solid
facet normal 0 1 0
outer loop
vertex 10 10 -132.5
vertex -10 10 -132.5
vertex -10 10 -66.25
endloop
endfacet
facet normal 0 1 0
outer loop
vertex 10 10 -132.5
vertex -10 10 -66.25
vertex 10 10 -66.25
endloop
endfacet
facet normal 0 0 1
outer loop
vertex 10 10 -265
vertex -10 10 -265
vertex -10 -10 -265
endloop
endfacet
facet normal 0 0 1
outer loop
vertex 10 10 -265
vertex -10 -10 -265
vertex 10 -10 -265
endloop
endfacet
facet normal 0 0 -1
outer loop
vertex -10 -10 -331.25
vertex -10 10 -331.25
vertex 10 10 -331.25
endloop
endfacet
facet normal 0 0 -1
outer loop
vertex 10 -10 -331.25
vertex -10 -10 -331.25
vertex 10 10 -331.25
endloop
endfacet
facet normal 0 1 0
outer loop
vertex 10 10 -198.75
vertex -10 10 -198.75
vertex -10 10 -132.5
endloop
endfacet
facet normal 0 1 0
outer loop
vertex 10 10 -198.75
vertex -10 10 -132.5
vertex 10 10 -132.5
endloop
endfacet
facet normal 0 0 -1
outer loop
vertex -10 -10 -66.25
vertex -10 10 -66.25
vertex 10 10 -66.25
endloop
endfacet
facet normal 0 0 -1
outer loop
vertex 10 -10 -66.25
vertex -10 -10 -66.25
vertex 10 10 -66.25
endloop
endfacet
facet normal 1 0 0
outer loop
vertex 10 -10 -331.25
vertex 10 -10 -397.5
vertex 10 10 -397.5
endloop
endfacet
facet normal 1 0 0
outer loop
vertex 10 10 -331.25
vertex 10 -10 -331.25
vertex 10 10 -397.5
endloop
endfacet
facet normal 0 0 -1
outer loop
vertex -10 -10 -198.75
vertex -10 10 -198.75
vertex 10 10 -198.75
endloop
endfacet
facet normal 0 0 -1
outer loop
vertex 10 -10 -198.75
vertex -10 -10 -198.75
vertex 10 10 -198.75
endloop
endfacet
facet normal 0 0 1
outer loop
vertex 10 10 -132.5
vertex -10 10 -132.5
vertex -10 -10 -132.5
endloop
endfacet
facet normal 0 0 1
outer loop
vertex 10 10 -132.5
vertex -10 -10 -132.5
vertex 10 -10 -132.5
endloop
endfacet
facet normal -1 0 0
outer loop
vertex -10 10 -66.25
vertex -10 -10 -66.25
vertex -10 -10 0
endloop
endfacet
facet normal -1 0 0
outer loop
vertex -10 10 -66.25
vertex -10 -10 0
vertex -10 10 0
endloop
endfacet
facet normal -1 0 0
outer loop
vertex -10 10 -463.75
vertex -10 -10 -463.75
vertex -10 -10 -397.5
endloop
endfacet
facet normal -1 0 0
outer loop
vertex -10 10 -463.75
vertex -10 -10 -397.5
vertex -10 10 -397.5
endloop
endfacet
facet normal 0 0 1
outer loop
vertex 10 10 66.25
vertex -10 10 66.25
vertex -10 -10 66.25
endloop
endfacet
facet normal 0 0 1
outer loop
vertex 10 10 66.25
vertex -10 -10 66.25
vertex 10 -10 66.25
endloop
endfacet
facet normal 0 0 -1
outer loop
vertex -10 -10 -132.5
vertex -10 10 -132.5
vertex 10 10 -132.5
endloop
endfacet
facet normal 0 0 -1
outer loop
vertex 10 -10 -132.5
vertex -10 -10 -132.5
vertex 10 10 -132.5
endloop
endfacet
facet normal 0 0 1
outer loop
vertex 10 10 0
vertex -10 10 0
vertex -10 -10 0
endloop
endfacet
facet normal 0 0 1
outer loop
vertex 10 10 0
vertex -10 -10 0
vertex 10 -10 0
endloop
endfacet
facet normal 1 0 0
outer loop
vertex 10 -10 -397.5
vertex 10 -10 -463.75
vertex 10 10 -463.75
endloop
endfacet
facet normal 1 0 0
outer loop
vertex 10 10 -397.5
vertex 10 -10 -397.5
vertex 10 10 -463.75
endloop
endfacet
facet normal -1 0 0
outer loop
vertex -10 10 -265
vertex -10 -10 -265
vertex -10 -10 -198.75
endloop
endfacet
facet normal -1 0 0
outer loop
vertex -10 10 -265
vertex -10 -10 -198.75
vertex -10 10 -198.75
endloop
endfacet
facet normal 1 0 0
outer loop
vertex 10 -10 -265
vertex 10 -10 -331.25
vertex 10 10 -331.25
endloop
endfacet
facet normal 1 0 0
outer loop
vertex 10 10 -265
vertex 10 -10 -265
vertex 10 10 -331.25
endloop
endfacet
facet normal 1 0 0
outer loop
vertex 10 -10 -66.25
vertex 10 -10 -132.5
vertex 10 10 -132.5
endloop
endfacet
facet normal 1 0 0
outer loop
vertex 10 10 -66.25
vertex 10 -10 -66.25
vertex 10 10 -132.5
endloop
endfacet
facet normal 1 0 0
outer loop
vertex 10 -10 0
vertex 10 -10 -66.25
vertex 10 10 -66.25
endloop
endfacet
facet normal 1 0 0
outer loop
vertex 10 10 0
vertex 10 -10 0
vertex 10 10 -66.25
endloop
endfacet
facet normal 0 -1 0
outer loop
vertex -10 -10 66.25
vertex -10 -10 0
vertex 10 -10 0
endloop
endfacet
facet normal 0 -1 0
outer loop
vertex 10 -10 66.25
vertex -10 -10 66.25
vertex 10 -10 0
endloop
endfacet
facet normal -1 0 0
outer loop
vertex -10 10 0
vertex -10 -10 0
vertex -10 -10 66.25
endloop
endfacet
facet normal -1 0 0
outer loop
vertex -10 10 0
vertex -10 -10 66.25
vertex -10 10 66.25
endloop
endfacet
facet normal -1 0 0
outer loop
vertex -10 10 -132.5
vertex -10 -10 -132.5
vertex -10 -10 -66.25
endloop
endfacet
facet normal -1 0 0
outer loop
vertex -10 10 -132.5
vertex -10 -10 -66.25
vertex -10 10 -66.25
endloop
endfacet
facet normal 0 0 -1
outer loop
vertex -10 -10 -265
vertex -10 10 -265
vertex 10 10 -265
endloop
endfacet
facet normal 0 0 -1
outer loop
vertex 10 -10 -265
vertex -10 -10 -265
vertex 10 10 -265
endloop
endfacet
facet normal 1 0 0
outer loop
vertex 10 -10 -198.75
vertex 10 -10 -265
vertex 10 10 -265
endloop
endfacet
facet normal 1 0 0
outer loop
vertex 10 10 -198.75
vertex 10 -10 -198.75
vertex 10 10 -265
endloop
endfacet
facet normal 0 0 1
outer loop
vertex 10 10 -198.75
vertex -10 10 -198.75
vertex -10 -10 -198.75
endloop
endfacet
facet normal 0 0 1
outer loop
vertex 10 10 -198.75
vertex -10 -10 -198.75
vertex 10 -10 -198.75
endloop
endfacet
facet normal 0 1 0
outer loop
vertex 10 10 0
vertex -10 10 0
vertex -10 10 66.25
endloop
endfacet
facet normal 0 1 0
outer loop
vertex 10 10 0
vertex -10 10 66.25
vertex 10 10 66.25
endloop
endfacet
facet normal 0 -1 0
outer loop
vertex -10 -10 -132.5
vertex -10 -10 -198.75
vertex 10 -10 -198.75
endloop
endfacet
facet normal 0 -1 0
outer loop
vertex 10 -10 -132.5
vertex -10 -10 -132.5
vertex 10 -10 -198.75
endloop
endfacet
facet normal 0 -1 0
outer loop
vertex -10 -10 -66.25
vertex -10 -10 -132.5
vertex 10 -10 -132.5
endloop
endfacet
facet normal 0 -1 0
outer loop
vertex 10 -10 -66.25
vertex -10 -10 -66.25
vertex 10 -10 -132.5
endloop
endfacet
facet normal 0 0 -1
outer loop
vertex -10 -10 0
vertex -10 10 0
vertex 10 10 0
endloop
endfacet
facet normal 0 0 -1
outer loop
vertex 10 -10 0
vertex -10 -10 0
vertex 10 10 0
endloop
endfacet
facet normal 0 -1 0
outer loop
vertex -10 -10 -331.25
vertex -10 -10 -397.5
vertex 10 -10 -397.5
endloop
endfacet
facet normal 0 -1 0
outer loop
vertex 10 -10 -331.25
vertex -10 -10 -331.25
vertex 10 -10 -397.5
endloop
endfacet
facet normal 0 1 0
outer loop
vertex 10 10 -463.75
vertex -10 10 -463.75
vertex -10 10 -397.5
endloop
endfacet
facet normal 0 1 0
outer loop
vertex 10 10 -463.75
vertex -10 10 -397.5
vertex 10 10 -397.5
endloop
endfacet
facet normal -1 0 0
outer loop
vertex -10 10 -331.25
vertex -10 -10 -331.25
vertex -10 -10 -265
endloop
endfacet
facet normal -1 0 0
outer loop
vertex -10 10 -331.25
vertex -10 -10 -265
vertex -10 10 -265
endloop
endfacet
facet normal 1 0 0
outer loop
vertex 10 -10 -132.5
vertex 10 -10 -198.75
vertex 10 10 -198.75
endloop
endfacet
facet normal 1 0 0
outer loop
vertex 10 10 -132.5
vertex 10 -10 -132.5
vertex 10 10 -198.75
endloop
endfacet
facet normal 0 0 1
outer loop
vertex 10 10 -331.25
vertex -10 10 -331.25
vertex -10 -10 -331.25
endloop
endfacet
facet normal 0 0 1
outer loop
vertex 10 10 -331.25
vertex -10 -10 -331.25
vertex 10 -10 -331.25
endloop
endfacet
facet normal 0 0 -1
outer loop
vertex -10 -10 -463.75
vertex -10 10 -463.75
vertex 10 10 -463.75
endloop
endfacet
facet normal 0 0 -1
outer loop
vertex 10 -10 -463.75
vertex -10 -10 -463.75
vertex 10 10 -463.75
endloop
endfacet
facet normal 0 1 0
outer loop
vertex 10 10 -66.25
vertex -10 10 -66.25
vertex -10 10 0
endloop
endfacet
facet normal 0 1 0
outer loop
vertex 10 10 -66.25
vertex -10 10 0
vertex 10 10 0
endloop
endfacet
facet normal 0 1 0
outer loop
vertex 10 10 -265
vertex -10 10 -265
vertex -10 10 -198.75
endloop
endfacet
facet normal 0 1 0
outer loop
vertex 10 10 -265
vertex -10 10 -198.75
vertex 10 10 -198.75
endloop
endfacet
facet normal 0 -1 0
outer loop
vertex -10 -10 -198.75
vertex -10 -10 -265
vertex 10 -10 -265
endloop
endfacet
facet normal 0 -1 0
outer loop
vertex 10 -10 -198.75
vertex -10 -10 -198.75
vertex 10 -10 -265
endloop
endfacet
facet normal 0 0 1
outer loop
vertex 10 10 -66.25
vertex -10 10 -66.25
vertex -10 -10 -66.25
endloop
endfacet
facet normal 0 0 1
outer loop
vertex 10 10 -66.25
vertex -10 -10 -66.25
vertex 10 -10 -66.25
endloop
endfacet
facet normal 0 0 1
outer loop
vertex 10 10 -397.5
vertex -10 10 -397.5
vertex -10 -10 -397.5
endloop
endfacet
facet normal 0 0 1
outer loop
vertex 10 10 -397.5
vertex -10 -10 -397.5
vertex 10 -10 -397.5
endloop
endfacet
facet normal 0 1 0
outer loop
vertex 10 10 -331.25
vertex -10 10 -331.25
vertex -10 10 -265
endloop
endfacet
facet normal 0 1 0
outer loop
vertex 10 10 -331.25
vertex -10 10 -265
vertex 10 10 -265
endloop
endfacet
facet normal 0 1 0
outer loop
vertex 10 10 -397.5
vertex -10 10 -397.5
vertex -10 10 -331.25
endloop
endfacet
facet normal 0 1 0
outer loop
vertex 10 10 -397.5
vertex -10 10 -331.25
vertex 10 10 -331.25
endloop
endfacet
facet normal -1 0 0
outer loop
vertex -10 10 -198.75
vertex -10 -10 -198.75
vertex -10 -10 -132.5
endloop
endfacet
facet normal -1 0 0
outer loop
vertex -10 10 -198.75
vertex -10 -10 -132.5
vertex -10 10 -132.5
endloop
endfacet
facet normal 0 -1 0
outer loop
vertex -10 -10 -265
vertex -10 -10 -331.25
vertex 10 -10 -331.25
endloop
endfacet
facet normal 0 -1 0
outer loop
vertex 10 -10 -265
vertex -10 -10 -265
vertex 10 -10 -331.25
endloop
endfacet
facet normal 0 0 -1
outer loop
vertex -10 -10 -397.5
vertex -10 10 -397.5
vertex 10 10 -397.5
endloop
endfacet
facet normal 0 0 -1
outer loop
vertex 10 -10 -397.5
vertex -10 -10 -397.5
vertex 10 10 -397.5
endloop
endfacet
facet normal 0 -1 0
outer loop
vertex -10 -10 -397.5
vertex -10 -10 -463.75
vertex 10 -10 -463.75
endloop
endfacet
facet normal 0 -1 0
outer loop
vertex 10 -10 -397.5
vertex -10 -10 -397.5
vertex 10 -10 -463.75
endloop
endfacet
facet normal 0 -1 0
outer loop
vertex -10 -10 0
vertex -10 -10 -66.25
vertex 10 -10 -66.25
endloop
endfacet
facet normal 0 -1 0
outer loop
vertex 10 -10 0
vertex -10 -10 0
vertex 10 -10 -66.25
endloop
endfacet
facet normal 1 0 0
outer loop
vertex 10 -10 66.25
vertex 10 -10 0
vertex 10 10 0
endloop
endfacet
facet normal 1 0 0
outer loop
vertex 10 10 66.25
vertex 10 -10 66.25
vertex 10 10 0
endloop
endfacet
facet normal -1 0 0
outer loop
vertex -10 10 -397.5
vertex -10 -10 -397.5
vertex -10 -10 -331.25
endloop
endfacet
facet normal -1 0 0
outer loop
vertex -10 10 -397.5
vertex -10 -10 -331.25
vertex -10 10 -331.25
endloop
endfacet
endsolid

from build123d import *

# Parameters (mm, degrees)
SKETCH1_W           = 20
SKETCH1_H           = 20
BOSS_EXTRUDE1_DEPTH = 66.25
LPATTERN1_COUNT     = 8
LPATTERN1_PITCH     = 66.25


with BuildPart() as part:
    # Sketch1 → Boss-Extrude1 (new body)
    with BuildSketch(Plane.XY):
        Rectangle(SKETCH1_W, SKETCH1_H)
    extrude(amount=BOSS_EXTRUDE1_DEPTH)


with BuildPart() as lpattern1_1:
    # LPattern1: pattern copy
    add(part.part.moved(Location(Vector(0, 0, -1) * (1 * LPATTERN1_PITCH))))


with BuildPart() as lpattern1_2:
    # LPattern1: pattern copy
    add(part.part.moved(Location(Vector(0, 0, -1) * (2 * LPATTERN1_PITCH))))


with BuildPart() as lpattern1_3:
    # LPattern1: pattern copy
    add(part.part.moved(Location(Vector(0, 0, -1) * (3 * LPATTERN1_PITCH))))


with BuildPart() as lpattern1_4:
    # LPattern1: pattern copy
    add(part.part.moved(Location(Vector(0, 0, -1) * (4 * LPATTERN1_PITCH))))


with BuildPart() as lpattern1_5:
    # LPattern1: pattern copy
    add(part.part.moved(Location(Vector(0, 0, -1) * (5 * LPATTERN1_PITCH))))


with BuildPart() as lpattern1_6:
    # LPattern1: pattern copy
    add(part.part.moved(Location(Vector(0, 0, -1) * (6 * LPATTERN1_PITCH))))


with BuildPart() as lpattern1_7:
    # LPattern1: pattern copy
    add(part.part.moved(Location(Vector(0, 0, -1) * (7 * LPATTERN1_PITCH))))


solid = Compound([part.part, lpattern1_1.part, lpattern1_2.part, lpattern1_3.part, lpattern1_4.part, lpattern1_5.part, lpattern1_6.part, lpattern1_7.part])
